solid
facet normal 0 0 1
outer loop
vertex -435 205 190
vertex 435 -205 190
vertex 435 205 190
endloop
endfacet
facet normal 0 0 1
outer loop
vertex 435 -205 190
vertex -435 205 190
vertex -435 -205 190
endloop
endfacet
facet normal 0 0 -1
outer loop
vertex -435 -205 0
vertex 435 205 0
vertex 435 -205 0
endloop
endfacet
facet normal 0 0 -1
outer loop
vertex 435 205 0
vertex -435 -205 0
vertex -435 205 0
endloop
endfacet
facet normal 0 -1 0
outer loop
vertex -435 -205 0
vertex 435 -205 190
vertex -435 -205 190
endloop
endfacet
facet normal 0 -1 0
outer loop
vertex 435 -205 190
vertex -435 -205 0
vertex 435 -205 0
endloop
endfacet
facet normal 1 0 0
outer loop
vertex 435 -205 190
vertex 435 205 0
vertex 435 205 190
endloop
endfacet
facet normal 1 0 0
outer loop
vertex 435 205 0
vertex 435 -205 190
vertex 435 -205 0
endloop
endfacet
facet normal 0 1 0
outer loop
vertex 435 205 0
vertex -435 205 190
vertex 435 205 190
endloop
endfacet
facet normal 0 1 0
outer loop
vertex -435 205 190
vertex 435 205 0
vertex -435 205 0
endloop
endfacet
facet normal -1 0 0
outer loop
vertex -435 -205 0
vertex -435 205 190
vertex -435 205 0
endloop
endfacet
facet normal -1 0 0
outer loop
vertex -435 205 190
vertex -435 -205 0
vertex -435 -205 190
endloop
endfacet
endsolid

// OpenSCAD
// Generated documentary F1 envelope proxy.
// Not manufacturing geometry, not dimensionally validated, not SimReady.
proxy_id = "993-INTERCOOLER-MOTORSPORT-FVD";
$fn = 96;

length_mm = 870;
width_mm = 410;
height_mm = 190;

translate([-length_mm / 2, -width_mm / 2, 0])
    cube([length_mm, width_mm, height_mm], center = false);
